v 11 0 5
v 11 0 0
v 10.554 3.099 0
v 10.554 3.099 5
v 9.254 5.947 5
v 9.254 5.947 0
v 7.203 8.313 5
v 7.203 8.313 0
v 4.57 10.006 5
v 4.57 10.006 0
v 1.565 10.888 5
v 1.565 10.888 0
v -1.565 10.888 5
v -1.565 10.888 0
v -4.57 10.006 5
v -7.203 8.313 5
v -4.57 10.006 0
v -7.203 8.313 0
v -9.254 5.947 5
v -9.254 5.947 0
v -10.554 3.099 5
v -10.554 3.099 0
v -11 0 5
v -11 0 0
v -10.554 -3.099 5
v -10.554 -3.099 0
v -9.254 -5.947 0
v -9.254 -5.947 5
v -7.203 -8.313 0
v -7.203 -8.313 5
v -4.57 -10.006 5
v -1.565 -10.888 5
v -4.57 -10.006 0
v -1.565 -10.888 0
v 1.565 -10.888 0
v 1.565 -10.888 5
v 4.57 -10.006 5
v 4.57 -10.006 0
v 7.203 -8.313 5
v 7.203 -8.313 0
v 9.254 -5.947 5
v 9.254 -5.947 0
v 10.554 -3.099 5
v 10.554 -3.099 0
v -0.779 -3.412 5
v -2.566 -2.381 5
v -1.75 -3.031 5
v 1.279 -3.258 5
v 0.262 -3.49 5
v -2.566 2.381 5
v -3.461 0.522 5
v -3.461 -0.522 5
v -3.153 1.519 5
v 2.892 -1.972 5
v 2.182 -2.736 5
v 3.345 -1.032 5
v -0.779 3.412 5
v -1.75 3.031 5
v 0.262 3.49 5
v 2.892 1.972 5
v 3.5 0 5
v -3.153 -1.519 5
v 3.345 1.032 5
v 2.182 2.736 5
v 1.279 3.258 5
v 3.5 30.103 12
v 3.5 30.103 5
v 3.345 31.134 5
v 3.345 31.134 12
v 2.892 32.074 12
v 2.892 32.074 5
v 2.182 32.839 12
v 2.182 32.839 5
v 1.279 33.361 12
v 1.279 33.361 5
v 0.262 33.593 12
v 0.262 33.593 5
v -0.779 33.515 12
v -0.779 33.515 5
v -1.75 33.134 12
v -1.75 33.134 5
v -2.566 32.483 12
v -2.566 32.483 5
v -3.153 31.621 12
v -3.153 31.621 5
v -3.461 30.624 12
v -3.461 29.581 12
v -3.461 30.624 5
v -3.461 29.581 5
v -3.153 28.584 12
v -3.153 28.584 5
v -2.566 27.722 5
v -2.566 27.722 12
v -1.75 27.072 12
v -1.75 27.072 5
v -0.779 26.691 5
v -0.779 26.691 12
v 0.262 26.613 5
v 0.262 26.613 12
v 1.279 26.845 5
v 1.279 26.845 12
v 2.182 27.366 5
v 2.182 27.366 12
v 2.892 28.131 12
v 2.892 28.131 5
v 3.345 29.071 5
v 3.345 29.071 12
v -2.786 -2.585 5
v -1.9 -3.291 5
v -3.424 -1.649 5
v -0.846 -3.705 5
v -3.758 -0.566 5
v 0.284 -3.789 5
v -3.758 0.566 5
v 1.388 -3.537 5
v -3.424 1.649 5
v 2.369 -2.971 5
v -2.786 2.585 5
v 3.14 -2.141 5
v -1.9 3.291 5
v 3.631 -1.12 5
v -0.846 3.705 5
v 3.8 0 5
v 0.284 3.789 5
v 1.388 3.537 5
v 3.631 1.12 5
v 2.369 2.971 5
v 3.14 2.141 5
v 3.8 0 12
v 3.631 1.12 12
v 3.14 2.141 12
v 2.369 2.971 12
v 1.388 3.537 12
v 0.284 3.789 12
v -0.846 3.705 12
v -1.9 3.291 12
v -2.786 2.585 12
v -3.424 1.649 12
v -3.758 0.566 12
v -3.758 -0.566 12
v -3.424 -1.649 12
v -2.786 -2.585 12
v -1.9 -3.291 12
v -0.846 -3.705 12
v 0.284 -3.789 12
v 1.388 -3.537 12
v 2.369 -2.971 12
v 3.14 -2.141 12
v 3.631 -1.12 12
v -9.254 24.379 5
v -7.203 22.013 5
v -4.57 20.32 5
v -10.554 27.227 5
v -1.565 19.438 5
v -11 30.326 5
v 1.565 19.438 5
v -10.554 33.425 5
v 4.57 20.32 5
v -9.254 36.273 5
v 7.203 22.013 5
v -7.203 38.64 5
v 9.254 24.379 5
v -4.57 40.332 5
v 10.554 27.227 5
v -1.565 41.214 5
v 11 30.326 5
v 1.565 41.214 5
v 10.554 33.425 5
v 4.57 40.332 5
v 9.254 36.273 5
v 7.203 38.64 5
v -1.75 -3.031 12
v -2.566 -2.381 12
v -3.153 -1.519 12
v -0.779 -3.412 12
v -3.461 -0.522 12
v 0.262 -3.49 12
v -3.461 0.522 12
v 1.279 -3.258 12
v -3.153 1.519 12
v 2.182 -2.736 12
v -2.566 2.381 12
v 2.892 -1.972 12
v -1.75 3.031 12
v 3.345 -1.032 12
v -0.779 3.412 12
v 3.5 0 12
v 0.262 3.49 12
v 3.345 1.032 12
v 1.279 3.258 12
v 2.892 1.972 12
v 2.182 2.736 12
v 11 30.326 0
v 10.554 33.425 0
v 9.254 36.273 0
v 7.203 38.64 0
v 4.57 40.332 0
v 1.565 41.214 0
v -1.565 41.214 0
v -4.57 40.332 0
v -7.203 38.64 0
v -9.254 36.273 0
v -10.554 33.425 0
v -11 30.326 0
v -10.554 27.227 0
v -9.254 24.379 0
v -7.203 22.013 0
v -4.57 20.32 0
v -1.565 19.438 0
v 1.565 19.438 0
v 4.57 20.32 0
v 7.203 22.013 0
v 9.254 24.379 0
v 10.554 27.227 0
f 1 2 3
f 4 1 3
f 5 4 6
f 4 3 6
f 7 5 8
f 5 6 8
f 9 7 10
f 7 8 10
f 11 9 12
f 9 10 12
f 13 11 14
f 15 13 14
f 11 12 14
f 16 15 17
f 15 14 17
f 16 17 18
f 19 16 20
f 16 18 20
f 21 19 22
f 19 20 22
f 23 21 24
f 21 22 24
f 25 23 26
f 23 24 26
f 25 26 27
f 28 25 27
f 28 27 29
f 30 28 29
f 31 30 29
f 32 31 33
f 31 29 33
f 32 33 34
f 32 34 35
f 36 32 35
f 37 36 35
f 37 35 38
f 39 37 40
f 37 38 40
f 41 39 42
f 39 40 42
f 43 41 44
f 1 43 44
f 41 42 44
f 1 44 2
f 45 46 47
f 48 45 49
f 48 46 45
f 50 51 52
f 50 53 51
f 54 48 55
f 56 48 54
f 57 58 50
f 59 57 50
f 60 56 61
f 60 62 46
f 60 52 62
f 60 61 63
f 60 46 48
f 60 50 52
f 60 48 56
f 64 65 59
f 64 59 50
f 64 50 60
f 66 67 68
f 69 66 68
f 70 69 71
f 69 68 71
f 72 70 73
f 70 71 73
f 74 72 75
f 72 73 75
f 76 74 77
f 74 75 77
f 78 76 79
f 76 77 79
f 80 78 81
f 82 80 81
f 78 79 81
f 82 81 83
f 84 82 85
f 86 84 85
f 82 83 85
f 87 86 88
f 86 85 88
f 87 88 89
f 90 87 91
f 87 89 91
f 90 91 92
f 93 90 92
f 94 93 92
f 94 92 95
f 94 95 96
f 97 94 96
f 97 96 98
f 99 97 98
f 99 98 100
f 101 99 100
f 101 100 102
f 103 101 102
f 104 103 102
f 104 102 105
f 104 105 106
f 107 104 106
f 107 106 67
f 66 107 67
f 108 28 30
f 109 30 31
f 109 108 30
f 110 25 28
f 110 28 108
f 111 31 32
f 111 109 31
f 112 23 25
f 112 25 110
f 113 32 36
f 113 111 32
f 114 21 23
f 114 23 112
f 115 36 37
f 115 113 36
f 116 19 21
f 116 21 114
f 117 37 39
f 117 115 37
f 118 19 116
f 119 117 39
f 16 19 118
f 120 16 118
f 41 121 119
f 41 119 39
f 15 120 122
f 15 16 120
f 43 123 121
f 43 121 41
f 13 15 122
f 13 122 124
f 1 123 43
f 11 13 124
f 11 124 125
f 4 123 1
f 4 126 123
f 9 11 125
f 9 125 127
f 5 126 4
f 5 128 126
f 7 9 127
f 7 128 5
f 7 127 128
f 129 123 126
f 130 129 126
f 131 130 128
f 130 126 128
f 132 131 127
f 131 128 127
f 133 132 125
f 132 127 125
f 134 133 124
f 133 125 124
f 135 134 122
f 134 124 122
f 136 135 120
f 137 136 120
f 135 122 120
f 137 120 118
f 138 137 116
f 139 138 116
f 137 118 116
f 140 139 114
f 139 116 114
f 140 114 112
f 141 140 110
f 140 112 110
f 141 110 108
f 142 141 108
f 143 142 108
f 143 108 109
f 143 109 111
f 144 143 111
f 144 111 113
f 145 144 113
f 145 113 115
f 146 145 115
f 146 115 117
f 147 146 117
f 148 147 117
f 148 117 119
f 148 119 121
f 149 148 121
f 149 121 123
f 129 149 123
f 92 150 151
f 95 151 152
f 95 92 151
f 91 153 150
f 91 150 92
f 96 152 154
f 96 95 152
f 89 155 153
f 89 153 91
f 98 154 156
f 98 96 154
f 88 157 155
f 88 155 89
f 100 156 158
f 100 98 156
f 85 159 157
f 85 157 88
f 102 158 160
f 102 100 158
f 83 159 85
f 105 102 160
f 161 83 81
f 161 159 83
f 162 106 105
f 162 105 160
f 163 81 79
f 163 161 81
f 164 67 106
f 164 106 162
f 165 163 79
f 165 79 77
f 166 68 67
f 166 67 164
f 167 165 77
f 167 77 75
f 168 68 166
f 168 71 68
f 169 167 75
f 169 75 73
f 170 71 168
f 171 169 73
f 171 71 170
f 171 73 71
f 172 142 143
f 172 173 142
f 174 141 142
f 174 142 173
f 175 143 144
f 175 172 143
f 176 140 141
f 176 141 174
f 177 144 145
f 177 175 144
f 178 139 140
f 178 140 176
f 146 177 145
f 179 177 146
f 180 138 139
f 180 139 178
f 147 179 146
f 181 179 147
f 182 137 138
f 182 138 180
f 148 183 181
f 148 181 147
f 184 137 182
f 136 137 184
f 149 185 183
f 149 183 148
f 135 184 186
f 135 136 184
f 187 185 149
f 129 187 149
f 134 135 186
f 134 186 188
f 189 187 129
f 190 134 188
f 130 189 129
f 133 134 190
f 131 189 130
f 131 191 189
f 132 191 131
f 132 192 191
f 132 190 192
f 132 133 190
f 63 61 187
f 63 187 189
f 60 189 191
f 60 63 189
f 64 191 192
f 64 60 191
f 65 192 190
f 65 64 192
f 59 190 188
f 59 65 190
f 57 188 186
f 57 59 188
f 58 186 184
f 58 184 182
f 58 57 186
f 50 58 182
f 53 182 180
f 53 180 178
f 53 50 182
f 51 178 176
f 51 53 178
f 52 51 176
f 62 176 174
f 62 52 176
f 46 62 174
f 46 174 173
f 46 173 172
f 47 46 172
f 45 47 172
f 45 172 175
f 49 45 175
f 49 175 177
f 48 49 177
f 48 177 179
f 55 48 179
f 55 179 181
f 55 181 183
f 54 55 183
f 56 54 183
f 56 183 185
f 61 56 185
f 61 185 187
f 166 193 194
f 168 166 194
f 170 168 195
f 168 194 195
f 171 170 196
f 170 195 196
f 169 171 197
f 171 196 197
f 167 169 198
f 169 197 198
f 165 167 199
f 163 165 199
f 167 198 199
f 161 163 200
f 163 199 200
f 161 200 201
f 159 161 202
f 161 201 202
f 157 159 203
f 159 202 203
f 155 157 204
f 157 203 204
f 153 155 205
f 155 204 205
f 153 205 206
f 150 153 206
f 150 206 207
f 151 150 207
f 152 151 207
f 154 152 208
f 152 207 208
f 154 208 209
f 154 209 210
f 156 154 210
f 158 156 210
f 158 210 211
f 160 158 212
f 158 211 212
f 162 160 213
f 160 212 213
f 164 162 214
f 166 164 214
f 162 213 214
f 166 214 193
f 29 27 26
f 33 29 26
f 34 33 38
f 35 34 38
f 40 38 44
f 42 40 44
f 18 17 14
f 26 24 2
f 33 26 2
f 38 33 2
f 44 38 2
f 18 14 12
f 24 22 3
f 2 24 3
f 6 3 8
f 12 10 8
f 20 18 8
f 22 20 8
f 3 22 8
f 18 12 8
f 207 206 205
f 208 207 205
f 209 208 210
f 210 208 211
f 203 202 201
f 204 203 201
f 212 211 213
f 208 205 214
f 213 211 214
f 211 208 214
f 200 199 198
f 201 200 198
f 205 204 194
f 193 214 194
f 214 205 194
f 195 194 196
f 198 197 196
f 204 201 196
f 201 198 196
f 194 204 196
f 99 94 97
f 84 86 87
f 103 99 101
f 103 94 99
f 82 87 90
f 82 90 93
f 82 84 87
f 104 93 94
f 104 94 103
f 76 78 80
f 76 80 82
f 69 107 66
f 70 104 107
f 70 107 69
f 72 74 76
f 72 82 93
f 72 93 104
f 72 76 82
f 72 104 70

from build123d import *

# Parameters (mm, degrees)
F0_R     = 11
F1_DEPTH = 5
F2_R     = 3.8
F2_R_2   = 3.5
F3_DEPTH = 12
F4_R     = 3.5
F5_DEPTH = 12


with BuildPart() as f1:
    # F0 (on Top) → F1 (new body)
    with BuildSketch(Plane.XY):
        Circle(F0_R)
        with Locations((0, 30.32637)):
            Circle(F0_R)
    extrude(amount=F1_DEPTH)

    # F2 (on Top) → F3 (join)
    with BuildSketch(Plane.XY):
        Circle(F2_R)
        Circle(F2_R_2, mode=Mode.SUBTRACT)
    extrude(amount=F3_DEPTH)

    # F4 (on Top) → F5 (join)
    with BuildSketch(Plane.XY):
        with Locations((0, 30.102823)):
            Circle(F4_R)
    extrude(amount=F5_DEPTH)


solid = f1.part
